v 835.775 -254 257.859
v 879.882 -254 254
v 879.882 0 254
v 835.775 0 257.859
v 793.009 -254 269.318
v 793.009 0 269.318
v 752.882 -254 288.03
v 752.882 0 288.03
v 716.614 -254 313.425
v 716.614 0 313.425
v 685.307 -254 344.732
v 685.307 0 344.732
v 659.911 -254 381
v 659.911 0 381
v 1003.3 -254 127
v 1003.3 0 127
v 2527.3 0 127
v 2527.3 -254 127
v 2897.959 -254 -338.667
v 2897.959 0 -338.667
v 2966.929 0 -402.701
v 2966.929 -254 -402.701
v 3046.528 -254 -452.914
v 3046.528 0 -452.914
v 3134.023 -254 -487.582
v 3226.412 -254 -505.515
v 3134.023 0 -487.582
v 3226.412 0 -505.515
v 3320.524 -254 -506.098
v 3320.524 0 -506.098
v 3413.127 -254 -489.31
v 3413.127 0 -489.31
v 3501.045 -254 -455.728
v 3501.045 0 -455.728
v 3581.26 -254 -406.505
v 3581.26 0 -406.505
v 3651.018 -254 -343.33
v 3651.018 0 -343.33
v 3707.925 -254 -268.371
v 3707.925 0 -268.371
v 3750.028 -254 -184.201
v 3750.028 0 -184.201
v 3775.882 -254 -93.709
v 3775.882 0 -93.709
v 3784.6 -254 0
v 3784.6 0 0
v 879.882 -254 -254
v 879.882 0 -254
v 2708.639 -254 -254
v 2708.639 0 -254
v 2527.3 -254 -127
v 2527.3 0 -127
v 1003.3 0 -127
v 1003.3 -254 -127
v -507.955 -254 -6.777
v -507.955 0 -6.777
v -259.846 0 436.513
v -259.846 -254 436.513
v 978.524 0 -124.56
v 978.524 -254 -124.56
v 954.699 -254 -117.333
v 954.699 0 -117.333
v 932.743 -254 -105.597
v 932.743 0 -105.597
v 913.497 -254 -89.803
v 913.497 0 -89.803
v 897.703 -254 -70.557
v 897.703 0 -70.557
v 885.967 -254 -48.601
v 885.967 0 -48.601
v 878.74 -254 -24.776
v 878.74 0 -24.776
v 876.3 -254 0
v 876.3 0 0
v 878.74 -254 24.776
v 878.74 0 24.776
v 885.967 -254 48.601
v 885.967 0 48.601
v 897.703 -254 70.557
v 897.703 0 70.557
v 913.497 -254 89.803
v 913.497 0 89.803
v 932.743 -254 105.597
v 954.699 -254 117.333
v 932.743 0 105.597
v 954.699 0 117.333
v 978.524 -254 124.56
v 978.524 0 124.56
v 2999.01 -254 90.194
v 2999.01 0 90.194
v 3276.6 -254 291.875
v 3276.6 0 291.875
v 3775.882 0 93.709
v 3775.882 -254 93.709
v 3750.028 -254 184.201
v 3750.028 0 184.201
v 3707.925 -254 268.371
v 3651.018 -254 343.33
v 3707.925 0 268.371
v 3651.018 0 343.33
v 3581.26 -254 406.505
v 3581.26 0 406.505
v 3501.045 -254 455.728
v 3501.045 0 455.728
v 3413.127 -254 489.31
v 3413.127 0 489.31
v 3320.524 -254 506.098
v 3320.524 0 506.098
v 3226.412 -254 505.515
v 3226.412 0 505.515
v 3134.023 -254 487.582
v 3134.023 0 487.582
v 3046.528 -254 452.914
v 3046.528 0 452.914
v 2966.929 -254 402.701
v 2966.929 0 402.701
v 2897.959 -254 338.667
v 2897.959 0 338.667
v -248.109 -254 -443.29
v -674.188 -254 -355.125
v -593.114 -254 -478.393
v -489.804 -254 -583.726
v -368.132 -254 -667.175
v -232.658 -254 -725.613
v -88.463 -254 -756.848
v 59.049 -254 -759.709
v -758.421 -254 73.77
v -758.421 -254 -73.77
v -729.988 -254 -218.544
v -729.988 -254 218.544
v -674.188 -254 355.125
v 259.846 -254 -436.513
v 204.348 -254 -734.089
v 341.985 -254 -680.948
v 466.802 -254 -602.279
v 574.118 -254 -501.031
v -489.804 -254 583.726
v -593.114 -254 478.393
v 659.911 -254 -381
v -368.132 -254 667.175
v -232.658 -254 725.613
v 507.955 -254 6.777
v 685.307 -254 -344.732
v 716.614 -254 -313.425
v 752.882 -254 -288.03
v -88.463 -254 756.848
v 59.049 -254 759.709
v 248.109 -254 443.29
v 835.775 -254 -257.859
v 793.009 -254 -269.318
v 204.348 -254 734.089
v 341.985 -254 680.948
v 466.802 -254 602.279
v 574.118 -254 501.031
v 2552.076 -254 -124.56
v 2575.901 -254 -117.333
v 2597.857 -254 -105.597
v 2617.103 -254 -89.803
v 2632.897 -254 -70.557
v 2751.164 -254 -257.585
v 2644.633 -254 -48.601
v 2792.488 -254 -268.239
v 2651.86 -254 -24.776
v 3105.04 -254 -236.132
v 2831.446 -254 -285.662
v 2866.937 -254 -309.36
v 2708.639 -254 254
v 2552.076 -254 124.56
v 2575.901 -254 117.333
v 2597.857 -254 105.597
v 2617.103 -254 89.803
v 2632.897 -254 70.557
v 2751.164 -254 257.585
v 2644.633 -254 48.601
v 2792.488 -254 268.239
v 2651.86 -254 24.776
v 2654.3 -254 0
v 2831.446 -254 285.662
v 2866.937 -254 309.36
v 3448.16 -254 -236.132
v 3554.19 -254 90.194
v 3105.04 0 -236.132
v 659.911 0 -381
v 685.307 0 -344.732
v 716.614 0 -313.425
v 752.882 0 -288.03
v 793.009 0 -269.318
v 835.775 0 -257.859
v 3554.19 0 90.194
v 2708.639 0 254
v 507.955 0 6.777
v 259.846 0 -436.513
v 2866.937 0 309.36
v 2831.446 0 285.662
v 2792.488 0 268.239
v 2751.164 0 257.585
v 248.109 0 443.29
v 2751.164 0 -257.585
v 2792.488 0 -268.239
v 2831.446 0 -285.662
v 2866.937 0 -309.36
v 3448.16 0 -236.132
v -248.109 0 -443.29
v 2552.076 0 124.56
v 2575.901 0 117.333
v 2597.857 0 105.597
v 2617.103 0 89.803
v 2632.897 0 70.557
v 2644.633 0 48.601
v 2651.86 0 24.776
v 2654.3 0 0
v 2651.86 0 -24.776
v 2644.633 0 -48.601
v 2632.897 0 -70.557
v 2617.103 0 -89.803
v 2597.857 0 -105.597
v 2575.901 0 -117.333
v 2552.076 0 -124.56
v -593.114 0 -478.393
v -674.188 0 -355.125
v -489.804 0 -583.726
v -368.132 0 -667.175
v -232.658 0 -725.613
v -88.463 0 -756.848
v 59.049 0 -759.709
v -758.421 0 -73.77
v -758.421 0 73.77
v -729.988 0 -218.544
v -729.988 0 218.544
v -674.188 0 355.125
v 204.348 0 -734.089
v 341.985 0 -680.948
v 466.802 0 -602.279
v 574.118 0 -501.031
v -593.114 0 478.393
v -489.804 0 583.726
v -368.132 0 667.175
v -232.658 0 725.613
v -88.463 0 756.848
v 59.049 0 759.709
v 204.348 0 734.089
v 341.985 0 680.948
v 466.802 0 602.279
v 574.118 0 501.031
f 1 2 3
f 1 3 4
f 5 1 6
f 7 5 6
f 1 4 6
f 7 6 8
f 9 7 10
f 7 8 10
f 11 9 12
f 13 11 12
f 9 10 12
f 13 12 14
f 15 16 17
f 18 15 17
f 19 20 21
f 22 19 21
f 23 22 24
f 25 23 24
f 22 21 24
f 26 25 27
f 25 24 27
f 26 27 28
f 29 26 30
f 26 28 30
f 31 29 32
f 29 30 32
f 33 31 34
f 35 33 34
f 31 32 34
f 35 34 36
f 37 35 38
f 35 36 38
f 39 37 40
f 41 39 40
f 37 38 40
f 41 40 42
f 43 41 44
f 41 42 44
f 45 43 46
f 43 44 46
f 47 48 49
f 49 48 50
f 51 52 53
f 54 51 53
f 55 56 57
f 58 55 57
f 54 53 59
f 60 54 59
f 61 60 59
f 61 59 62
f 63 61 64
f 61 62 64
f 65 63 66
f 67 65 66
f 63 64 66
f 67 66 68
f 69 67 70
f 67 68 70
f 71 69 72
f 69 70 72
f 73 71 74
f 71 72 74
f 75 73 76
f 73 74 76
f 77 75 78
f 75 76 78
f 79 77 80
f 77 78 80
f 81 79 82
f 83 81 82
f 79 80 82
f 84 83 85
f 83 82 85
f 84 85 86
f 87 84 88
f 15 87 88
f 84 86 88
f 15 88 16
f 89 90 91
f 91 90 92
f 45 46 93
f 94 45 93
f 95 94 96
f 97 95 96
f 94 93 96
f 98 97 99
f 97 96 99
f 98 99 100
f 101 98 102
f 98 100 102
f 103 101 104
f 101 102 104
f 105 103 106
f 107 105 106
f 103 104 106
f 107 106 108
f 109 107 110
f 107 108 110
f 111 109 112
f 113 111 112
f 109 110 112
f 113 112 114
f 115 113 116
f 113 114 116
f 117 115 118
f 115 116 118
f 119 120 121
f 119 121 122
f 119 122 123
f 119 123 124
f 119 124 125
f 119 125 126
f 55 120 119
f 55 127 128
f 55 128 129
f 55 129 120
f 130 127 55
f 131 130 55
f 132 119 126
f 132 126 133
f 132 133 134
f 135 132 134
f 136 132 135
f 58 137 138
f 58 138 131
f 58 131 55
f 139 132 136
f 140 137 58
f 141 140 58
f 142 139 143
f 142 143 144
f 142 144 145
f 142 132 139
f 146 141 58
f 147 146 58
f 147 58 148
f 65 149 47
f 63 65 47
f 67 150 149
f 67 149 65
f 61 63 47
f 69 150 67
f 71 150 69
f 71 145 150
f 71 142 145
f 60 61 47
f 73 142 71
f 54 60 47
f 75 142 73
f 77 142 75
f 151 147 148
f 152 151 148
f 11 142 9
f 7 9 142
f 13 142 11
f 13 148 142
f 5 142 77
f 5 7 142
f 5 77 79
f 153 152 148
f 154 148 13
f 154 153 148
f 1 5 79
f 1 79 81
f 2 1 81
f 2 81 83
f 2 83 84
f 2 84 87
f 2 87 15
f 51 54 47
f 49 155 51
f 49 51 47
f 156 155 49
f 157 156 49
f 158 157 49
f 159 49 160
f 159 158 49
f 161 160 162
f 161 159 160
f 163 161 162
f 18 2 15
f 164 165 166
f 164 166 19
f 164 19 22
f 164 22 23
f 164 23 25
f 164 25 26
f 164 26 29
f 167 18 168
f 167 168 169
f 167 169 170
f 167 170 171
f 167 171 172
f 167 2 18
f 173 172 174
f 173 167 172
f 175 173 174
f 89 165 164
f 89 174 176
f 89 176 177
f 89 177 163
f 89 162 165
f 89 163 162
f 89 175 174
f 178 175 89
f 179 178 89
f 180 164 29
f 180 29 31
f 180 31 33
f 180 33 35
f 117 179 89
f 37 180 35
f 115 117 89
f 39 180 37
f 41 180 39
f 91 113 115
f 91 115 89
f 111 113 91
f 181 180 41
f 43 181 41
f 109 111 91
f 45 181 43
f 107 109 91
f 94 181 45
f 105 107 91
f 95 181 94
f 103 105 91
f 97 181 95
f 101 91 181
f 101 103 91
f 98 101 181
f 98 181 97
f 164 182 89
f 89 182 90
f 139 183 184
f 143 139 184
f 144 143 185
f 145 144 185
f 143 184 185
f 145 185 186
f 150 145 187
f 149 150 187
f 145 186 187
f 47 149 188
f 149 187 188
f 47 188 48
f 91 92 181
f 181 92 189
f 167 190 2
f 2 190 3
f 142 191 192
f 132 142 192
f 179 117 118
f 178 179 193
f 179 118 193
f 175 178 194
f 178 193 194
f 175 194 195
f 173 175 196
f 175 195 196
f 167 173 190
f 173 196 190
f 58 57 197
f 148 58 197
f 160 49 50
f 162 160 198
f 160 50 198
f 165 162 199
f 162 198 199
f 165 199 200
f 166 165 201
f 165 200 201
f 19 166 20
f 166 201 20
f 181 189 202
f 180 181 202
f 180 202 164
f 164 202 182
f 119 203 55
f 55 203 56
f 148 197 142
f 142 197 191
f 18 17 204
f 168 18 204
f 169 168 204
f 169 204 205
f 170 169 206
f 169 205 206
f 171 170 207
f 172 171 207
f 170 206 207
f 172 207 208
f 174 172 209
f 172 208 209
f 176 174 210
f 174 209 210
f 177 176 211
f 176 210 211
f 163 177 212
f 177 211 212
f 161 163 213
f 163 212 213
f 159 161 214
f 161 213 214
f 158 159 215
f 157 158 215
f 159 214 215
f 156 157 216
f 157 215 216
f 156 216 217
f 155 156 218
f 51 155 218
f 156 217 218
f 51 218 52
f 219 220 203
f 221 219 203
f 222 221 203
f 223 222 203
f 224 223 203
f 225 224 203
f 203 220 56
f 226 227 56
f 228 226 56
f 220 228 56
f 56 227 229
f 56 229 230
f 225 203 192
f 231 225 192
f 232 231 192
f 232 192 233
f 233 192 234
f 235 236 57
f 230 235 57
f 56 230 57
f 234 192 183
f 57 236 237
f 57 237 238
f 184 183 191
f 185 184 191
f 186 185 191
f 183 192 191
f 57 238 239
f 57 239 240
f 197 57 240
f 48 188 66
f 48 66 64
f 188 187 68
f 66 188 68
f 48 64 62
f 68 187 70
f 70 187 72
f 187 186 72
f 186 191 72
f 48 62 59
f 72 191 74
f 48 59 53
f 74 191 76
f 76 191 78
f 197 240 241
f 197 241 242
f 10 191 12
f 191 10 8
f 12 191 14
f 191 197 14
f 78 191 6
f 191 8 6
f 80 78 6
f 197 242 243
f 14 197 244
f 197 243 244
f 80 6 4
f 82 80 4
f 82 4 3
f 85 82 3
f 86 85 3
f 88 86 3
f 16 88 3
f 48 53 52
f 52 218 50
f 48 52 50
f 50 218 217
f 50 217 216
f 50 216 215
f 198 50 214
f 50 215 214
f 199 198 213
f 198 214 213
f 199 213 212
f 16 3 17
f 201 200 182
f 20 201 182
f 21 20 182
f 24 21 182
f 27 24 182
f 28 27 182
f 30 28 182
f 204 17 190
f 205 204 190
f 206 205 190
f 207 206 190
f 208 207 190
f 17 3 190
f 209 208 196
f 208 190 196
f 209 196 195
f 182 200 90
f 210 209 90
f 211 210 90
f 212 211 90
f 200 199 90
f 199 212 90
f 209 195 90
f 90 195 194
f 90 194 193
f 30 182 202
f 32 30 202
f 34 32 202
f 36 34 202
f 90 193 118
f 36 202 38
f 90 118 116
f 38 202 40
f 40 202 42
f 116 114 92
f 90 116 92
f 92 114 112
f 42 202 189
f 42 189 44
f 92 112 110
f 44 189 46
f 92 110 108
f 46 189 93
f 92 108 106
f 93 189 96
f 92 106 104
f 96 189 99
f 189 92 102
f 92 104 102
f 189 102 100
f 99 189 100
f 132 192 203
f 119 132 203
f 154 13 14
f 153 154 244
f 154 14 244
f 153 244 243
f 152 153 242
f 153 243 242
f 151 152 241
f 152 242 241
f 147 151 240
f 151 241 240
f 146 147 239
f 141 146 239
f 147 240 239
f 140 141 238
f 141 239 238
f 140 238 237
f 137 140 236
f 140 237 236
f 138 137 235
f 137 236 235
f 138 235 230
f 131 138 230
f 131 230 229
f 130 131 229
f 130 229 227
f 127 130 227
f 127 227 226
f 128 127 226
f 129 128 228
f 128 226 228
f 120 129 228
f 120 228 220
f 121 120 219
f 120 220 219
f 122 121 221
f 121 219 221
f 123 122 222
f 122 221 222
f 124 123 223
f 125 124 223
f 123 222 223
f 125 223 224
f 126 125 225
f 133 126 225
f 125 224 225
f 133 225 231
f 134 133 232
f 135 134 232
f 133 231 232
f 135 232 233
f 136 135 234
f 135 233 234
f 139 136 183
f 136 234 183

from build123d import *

# Parameters (mm, degrees)
F1_DEPTH = 254


with BuildPart() as f1:
    # F0 (on Front) → F1 (new body)
    with BuildSketch(Plane.XZ):
        with BuildLine():
            ThreePointArc((3784.6, 0), (3457.865622, 474.559558), (2897.959156, 338.666667))
            ThreePointArc((2897.959156, 338.666667), (2768.6, 0), (2897.959156, -338.666667))
            ThreePointArc((2897.959156, -338.666667), (3457.865622, -474.559558), (3784.6, 0))
        make_face()
        Polygon((2999.01039, 90.194332), (3276.6, 291.874989), (3554.18961, 90.194332), (3448.159814, -236.131826), (3105.040186, -236.131826), align=None, mode=Mode.SUBTRACT)
        with BuildLine():
            ThreePointArc((659.911358, 381), (736.03548, 197.220112), (762, 0))
            ThreePointArc((762, 0), (736.03548, -197.220112), (659.911358, -381))
            ThreePointArc((659.911358, -381), (752.88181, -288.029547), (879.88181, -254))
            Line((879.88181, -254), (1765.3, -254))
            Line((1765.3, -254), (2708.638734, -254))
            ThreePointArc((2708.638734, -254), (2812.333799, -276.130784), (2897.959156, -338.666667))
            ThreePointArc((2897.959156, -338.666667), (2768.6, 0), (2897.959156, 338.666667))
            ThreePointArc((2897.959156, 338.666667), (2812.333799, 276.130784), (2708.638734, 254))
            Line((2708.638734, 254), (1765.3, 254))
            Line((1765.3, 254), (879.88181, 254))
            ThreePointArc((879.88181, 254), (752.88181, 288.029547), (659.911358, 381))
        make_face()
        with BuildLine():
            Line((1003.3, 127), (1765.3, 127))
            Line((1765.3, 127), (2527.3, 127))
            ThreePointArc((2527.3, 127), (2654.3, 0), (2527.3, -127))
            Line((2527.3, -127), (1003.3, -127))
            ThreePointArc((1003.3, -127), (876.3, 0), (1003.3, 127))
        make_face(mode=Mode.SUBTRACT)
        with BuildLine():
            ThreePointArc((659.911358, -381), (736.03548, -197.220112), (762, 0))
            ThreePointArc((762, 0), (736.03548, 197.220112), (659.911358, 381))
            ThreePointArc((659.911358, 381), (-762, 0), (659.911358, -381))
        make_face()
        Polygon((-259.846082, 436.513475), (248.108718, 443.290045), (507.954799, 6.77657), (259.846082, -436.513475), (-248.108718, -443.290045), (-507.954799, -6.77657), align=None, mode=Mode.SUBTRACT)
    extrude(amount=F1_DEPTH)


solid = f1.part
